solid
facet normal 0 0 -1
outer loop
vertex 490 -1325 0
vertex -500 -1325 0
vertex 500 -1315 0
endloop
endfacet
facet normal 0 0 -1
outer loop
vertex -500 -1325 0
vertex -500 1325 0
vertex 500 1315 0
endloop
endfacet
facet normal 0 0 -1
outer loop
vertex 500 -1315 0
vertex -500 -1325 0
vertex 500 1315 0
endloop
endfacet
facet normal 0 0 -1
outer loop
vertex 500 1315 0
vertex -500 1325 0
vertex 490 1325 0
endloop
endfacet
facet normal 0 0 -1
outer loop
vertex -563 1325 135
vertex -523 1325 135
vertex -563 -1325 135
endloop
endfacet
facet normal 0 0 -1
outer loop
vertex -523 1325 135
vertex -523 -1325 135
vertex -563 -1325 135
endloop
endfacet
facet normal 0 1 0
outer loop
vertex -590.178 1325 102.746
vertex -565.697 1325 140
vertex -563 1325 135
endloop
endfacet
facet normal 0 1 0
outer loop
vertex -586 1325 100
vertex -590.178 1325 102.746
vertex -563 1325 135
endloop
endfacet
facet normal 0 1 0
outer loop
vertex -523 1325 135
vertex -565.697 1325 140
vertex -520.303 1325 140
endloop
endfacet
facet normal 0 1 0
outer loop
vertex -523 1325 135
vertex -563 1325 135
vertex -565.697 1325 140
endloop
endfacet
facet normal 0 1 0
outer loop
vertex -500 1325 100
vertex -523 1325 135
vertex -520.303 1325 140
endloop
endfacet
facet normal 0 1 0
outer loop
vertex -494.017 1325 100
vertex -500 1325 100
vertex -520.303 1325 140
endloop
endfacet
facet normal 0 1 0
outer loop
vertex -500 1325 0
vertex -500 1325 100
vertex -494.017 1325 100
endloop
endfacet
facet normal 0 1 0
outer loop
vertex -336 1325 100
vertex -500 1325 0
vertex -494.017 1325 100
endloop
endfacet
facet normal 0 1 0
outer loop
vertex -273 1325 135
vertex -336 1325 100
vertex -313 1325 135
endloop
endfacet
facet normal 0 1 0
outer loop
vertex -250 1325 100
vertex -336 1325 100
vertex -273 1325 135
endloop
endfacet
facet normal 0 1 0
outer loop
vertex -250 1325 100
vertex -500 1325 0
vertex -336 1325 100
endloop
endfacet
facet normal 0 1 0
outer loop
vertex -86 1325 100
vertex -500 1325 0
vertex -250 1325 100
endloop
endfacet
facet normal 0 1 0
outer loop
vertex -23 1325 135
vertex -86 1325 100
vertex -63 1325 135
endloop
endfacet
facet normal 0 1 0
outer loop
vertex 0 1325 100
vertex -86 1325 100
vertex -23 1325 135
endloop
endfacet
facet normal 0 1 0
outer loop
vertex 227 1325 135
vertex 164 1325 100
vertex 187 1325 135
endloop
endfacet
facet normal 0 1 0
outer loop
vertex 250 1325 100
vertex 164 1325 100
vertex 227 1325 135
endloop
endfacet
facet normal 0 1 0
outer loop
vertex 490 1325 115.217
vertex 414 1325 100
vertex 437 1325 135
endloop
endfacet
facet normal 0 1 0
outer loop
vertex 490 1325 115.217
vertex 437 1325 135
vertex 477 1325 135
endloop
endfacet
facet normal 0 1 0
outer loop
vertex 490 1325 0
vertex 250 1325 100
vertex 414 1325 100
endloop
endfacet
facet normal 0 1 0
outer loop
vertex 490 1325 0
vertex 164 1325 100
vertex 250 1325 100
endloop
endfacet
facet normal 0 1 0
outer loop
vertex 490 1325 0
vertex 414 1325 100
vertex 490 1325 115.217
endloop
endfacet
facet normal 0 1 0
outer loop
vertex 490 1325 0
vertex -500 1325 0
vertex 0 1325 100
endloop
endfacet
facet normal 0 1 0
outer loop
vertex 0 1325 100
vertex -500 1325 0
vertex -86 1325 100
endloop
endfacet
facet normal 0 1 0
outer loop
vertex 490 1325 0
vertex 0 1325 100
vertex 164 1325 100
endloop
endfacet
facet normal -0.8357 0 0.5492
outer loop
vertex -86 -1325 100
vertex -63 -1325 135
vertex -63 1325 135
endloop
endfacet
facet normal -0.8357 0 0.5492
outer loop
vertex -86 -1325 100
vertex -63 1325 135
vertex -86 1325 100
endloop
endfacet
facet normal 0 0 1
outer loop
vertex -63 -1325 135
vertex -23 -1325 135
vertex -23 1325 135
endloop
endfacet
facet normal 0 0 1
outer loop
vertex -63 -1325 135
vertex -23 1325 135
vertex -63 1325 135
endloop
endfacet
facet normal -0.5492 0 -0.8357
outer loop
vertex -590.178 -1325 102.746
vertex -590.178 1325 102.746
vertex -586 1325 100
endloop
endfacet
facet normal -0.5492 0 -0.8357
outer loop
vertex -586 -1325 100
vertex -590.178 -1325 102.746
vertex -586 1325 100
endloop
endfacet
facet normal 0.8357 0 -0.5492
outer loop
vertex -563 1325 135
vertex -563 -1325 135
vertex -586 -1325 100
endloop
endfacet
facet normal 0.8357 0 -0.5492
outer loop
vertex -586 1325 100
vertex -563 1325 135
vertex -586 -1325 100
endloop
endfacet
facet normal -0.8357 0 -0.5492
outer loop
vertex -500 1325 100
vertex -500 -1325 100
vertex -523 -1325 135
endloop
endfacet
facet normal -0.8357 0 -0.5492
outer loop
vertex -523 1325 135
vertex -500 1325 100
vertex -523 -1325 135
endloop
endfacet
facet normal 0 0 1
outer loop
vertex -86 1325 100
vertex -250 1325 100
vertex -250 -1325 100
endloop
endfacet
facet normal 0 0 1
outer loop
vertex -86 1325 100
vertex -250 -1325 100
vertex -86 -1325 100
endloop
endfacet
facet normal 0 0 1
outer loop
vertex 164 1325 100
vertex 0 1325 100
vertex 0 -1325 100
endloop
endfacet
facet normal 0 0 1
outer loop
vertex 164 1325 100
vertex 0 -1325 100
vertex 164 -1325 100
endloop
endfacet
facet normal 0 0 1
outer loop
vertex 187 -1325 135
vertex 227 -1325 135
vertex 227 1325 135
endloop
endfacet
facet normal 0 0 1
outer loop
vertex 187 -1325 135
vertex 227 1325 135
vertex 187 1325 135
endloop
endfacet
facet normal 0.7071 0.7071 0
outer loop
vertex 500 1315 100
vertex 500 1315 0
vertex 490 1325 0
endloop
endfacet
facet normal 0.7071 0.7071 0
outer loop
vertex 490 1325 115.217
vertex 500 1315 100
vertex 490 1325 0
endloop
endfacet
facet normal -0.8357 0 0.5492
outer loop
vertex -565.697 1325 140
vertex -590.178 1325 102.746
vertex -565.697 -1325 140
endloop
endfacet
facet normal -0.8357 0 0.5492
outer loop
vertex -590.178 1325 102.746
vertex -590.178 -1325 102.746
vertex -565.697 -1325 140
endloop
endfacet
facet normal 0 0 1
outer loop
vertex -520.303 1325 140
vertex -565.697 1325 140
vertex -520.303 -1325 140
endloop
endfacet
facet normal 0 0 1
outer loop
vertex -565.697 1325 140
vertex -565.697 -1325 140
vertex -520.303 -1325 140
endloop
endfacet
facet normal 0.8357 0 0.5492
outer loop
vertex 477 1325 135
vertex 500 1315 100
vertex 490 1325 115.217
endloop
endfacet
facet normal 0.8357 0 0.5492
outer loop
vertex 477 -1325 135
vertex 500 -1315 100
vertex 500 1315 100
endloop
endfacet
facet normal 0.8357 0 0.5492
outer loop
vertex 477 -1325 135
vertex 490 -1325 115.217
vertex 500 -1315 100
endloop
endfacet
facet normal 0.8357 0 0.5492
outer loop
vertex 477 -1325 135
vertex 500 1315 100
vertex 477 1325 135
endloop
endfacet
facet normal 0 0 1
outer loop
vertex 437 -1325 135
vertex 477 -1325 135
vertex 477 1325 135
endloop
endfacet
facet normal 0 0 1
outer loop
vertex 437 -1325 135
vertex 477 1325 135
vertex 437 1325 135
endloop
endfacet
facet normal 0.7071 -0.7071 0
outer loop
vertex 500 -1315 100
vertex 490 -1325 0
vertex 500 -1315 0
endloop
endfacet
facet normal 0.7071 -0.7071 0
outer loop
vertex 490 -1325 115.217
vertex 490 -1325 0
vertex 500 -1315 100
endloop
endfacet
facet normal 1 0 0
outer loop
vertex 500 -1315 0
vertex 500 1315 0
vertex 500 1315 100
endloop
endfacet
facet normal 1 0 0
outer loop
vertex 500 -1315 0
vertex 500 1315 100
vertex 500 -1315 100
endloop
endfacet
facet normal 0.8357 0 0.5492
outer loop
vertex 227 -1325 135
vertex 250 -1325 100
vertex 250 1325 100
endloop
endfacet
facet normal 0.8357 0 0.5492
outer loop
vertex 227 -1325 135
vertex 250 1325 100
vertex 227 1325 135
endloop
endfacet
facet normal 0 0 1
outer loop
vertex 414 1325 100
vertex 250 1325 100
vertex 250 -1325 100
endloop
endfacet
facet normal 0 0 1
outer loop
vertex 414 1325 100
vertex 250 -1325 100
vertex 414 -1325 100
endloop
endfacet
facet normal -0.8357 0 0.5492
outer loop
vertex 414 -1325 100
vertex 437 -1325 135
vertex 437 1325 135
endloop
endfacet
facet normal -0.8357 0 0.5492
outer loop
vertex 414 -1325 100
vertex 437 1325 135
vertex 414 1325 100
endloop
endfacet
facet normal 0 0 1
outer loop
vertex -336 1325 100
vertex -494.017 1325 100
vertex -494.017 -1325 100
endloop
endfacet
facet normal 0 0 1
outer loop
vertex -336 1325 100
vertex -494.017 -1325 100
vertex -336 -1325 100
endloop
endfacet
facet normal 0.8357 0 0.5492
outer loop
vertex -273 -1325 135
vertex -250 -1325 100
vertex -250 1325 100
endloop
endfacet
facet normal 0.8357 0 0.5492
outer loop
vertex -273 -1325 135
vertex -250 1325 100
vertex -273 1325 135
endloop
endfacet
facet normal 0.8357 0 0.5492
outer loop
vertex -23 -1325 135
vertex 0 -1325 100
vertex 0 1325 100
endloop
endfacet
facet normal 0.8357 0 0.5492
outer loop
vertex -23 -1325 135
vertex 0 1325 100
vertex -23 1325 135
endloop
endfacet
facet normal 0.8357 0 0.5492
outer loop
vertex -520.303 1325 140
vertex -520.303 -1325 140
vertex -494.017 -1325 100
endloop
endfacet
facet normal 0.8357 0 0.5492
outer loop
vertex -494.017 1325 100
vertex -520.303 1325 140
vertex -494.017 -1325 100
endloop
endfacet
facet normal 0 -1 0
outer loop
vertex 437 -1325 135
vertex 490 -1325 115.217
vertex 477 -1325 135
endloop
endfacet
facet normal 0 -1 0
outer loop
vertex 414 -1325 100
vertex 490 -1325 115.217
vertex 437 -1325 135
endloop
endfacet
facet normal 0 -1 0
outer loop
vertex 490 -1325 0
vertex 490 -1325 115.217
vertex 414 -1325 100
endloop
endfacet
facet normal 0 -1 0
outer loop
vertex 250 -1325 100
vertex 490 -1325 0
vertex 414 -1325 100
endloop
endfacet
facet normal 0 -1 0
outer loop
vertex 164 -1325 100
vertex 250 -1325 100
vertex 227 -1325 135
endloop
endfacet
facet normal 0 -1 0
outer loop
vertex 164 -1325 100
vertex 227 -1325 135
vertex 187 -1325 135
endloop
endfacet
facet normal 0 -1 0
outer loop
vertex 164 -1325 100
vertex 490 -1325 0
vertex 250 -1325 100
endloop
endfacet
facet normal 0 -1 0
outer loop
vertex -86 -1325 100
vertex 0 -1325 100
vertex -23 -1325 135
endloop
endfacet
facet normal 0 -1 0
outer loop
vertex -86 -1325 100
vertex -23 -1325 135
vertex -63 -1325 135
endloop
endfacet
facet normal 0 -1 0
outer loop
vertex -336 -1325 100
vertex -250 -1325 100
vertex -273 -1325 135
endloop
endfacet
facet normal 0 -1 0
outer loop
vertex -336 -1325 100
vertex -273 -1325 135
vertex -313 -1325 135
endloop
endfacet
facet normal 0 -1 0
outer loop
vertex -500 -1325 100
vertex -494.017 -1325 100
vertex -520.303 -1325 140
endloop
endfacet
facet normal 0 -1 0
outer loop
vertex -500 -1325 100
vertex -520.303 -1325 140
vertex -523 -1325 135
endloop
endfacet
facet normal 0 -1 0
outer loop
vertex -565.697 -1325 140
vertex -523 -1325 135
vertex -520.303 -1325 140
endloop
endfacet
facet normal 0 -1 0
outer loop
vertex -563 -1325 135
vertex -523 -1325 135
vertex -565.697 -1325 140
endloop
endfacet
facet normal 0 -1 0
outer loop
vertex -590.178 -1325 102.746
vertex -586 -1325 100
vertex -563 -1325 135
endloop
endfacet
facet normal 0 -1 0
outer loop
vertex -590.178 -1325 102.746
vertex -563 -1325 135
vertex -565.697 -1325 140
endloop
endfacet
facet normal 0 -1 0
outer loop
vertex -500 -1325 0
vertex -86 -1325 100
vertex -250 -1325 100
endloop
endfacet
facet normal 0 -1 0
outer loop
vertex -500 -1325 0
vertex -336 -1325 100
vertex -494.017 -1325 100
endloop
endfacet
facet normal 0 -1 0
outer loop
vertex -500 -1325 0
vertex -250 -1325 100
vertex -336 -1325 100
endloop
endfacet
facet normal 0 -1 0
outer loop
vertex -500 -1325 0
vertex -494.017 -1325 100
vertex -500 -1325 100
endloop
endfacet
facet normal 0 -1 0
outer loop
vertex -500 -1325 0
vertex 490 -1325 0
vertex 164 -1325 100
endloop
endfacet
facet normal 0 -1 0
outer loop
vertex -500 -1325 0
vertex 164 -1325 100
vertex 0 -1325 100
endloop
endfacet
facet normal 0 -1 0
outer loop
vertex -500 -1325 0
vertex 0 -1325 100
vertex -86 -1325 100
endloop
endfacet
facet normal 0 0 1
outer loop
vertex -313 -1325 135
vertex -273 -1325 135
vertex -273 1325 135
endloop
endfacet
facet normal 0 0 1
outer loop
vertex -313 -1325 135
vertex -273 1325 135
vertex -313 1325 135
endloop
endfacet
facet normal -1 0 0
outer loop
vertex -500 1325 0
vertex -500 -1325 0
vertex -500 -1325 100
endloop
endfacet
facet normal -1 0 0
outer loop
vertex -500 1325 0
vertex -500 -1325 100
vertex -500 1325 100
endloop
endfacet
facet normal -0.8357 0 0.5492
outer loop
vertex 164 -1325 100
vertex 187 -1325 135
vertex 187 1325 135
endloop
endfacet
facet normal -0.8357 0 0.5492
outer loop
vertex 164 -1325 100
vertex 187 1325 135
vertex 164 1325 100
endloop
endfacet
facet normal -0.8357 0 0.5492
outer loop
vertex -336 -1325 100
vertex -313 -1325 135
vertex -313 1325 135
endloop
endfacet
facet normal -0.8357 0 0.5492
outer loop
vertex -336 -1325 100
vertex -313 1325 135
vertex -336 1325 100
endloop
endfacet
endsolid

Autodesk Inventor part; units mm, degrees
ref_plane "YZ Plane" through (0, 0, 0) normal (1, 0, 0) x (0, 1, 0)
ref_plane "XZ Plane" through (0, 0, 0) normal (0, 1, 0) x (-1, 0, 0)
ref_plane "XY Plane" through (0, 0, 0) normal (0, 0, 1) x (1, 0, 0)
sketch "Sketch1" plane through (0, 0, 0) normal (0, 0, 1) x (1, 0, 0)
  line L0 (-500, 1325) -> (500, 1325)
  line L1 (500, 1325) -> (500, -1325)
  line L2 (500, -1325) -> (-500, -1325)
  line L3 (-500, -1325) -> (-500, 1325)
  line L4 (-500, 1325) -> (500, -1325) construction
  line L5 (500, 1325) -> (-500, -1325) construction
  point P0 (0, 0)
  dimension "d0" = 1000
  dimension "d1" = 2650
extrude "Extrusion1" add sketch "Sketch1" along normal blind 100
sketch "Sketch2" plane through (-500, -1325, 0) normal (0, -1, 0) x (1, 0, 0)
  line L0 (0, 0) -> (1000, 0) projected
  line L1 (1000, 0) -> (1000, 100) projected
  line L2 (0, 100) -> (1000, 100) projected
  line L3 (0, 0) -> (0, 100) projected
  line L4 (0, 100) -> (1000, 100) projected
  line L5 (1000, 100) -> (977, 135)
  line L6 (977, 135) -> (937, 135)
  line L7 (937, 135) -> (914, 100)
  line L8 (687, 135) -> (664, 100)
  line L9 (727, 135) -> (687, 135)
  line L10 (750, 100) -> (727, 135)
  line L11 (437, 135) -> (414, 100)
  line L12 (477, 135) -> (437, 135)
  line L13 (500, 100) -> (477, 135)
  line L14 (187, 135) -> (164, 100)
  line L15 (227, 135) -> (187, 135)
  line L16 (250, 100) -> (227, 135)
  line L17 (-63, 135) -> (-86, 100)
  line L18 (-23, 135) -> (-63, 135)
  line L19 (0, 100) -> (-23, 135)
  line L20 (-90.1785, 102.7459) -> (-65.6973, 140)
  line L21 (-65.6973, 140) -> (-20.3027, 140)
  line L22 (-20.3027, 140) -> (5.983, 100)
  line L23 (-90.1785, 102.7459) -> (-86, 100)
  point P0 (500, 0)
  point P1 (5.983, 100)
  dimension "d4" = 86
  dimension "d5" = 40
  dimension "d6" = 35
  dimension "d11" = 250
  dimension "d16" = 5
  dimension "d17" = 5
extrude "Extrusion2" add sketch "Sketch2" against normal up to surface (2650 mm away) contours L19 L18 L17 L23 L20 L21 L22 L2 | L2 L7 L6 L5 | L14 L15 L16 L2 | L2 L8 L9 L10 | L11 L12 L13 L2
chamfer "Chamfer1" distance 10 angle 45 2 edges at (500, -1325, 50) (500, 1325, 50)
equation "\"d17\" = d16"
properties part number "Sandwich 5  roof long"
